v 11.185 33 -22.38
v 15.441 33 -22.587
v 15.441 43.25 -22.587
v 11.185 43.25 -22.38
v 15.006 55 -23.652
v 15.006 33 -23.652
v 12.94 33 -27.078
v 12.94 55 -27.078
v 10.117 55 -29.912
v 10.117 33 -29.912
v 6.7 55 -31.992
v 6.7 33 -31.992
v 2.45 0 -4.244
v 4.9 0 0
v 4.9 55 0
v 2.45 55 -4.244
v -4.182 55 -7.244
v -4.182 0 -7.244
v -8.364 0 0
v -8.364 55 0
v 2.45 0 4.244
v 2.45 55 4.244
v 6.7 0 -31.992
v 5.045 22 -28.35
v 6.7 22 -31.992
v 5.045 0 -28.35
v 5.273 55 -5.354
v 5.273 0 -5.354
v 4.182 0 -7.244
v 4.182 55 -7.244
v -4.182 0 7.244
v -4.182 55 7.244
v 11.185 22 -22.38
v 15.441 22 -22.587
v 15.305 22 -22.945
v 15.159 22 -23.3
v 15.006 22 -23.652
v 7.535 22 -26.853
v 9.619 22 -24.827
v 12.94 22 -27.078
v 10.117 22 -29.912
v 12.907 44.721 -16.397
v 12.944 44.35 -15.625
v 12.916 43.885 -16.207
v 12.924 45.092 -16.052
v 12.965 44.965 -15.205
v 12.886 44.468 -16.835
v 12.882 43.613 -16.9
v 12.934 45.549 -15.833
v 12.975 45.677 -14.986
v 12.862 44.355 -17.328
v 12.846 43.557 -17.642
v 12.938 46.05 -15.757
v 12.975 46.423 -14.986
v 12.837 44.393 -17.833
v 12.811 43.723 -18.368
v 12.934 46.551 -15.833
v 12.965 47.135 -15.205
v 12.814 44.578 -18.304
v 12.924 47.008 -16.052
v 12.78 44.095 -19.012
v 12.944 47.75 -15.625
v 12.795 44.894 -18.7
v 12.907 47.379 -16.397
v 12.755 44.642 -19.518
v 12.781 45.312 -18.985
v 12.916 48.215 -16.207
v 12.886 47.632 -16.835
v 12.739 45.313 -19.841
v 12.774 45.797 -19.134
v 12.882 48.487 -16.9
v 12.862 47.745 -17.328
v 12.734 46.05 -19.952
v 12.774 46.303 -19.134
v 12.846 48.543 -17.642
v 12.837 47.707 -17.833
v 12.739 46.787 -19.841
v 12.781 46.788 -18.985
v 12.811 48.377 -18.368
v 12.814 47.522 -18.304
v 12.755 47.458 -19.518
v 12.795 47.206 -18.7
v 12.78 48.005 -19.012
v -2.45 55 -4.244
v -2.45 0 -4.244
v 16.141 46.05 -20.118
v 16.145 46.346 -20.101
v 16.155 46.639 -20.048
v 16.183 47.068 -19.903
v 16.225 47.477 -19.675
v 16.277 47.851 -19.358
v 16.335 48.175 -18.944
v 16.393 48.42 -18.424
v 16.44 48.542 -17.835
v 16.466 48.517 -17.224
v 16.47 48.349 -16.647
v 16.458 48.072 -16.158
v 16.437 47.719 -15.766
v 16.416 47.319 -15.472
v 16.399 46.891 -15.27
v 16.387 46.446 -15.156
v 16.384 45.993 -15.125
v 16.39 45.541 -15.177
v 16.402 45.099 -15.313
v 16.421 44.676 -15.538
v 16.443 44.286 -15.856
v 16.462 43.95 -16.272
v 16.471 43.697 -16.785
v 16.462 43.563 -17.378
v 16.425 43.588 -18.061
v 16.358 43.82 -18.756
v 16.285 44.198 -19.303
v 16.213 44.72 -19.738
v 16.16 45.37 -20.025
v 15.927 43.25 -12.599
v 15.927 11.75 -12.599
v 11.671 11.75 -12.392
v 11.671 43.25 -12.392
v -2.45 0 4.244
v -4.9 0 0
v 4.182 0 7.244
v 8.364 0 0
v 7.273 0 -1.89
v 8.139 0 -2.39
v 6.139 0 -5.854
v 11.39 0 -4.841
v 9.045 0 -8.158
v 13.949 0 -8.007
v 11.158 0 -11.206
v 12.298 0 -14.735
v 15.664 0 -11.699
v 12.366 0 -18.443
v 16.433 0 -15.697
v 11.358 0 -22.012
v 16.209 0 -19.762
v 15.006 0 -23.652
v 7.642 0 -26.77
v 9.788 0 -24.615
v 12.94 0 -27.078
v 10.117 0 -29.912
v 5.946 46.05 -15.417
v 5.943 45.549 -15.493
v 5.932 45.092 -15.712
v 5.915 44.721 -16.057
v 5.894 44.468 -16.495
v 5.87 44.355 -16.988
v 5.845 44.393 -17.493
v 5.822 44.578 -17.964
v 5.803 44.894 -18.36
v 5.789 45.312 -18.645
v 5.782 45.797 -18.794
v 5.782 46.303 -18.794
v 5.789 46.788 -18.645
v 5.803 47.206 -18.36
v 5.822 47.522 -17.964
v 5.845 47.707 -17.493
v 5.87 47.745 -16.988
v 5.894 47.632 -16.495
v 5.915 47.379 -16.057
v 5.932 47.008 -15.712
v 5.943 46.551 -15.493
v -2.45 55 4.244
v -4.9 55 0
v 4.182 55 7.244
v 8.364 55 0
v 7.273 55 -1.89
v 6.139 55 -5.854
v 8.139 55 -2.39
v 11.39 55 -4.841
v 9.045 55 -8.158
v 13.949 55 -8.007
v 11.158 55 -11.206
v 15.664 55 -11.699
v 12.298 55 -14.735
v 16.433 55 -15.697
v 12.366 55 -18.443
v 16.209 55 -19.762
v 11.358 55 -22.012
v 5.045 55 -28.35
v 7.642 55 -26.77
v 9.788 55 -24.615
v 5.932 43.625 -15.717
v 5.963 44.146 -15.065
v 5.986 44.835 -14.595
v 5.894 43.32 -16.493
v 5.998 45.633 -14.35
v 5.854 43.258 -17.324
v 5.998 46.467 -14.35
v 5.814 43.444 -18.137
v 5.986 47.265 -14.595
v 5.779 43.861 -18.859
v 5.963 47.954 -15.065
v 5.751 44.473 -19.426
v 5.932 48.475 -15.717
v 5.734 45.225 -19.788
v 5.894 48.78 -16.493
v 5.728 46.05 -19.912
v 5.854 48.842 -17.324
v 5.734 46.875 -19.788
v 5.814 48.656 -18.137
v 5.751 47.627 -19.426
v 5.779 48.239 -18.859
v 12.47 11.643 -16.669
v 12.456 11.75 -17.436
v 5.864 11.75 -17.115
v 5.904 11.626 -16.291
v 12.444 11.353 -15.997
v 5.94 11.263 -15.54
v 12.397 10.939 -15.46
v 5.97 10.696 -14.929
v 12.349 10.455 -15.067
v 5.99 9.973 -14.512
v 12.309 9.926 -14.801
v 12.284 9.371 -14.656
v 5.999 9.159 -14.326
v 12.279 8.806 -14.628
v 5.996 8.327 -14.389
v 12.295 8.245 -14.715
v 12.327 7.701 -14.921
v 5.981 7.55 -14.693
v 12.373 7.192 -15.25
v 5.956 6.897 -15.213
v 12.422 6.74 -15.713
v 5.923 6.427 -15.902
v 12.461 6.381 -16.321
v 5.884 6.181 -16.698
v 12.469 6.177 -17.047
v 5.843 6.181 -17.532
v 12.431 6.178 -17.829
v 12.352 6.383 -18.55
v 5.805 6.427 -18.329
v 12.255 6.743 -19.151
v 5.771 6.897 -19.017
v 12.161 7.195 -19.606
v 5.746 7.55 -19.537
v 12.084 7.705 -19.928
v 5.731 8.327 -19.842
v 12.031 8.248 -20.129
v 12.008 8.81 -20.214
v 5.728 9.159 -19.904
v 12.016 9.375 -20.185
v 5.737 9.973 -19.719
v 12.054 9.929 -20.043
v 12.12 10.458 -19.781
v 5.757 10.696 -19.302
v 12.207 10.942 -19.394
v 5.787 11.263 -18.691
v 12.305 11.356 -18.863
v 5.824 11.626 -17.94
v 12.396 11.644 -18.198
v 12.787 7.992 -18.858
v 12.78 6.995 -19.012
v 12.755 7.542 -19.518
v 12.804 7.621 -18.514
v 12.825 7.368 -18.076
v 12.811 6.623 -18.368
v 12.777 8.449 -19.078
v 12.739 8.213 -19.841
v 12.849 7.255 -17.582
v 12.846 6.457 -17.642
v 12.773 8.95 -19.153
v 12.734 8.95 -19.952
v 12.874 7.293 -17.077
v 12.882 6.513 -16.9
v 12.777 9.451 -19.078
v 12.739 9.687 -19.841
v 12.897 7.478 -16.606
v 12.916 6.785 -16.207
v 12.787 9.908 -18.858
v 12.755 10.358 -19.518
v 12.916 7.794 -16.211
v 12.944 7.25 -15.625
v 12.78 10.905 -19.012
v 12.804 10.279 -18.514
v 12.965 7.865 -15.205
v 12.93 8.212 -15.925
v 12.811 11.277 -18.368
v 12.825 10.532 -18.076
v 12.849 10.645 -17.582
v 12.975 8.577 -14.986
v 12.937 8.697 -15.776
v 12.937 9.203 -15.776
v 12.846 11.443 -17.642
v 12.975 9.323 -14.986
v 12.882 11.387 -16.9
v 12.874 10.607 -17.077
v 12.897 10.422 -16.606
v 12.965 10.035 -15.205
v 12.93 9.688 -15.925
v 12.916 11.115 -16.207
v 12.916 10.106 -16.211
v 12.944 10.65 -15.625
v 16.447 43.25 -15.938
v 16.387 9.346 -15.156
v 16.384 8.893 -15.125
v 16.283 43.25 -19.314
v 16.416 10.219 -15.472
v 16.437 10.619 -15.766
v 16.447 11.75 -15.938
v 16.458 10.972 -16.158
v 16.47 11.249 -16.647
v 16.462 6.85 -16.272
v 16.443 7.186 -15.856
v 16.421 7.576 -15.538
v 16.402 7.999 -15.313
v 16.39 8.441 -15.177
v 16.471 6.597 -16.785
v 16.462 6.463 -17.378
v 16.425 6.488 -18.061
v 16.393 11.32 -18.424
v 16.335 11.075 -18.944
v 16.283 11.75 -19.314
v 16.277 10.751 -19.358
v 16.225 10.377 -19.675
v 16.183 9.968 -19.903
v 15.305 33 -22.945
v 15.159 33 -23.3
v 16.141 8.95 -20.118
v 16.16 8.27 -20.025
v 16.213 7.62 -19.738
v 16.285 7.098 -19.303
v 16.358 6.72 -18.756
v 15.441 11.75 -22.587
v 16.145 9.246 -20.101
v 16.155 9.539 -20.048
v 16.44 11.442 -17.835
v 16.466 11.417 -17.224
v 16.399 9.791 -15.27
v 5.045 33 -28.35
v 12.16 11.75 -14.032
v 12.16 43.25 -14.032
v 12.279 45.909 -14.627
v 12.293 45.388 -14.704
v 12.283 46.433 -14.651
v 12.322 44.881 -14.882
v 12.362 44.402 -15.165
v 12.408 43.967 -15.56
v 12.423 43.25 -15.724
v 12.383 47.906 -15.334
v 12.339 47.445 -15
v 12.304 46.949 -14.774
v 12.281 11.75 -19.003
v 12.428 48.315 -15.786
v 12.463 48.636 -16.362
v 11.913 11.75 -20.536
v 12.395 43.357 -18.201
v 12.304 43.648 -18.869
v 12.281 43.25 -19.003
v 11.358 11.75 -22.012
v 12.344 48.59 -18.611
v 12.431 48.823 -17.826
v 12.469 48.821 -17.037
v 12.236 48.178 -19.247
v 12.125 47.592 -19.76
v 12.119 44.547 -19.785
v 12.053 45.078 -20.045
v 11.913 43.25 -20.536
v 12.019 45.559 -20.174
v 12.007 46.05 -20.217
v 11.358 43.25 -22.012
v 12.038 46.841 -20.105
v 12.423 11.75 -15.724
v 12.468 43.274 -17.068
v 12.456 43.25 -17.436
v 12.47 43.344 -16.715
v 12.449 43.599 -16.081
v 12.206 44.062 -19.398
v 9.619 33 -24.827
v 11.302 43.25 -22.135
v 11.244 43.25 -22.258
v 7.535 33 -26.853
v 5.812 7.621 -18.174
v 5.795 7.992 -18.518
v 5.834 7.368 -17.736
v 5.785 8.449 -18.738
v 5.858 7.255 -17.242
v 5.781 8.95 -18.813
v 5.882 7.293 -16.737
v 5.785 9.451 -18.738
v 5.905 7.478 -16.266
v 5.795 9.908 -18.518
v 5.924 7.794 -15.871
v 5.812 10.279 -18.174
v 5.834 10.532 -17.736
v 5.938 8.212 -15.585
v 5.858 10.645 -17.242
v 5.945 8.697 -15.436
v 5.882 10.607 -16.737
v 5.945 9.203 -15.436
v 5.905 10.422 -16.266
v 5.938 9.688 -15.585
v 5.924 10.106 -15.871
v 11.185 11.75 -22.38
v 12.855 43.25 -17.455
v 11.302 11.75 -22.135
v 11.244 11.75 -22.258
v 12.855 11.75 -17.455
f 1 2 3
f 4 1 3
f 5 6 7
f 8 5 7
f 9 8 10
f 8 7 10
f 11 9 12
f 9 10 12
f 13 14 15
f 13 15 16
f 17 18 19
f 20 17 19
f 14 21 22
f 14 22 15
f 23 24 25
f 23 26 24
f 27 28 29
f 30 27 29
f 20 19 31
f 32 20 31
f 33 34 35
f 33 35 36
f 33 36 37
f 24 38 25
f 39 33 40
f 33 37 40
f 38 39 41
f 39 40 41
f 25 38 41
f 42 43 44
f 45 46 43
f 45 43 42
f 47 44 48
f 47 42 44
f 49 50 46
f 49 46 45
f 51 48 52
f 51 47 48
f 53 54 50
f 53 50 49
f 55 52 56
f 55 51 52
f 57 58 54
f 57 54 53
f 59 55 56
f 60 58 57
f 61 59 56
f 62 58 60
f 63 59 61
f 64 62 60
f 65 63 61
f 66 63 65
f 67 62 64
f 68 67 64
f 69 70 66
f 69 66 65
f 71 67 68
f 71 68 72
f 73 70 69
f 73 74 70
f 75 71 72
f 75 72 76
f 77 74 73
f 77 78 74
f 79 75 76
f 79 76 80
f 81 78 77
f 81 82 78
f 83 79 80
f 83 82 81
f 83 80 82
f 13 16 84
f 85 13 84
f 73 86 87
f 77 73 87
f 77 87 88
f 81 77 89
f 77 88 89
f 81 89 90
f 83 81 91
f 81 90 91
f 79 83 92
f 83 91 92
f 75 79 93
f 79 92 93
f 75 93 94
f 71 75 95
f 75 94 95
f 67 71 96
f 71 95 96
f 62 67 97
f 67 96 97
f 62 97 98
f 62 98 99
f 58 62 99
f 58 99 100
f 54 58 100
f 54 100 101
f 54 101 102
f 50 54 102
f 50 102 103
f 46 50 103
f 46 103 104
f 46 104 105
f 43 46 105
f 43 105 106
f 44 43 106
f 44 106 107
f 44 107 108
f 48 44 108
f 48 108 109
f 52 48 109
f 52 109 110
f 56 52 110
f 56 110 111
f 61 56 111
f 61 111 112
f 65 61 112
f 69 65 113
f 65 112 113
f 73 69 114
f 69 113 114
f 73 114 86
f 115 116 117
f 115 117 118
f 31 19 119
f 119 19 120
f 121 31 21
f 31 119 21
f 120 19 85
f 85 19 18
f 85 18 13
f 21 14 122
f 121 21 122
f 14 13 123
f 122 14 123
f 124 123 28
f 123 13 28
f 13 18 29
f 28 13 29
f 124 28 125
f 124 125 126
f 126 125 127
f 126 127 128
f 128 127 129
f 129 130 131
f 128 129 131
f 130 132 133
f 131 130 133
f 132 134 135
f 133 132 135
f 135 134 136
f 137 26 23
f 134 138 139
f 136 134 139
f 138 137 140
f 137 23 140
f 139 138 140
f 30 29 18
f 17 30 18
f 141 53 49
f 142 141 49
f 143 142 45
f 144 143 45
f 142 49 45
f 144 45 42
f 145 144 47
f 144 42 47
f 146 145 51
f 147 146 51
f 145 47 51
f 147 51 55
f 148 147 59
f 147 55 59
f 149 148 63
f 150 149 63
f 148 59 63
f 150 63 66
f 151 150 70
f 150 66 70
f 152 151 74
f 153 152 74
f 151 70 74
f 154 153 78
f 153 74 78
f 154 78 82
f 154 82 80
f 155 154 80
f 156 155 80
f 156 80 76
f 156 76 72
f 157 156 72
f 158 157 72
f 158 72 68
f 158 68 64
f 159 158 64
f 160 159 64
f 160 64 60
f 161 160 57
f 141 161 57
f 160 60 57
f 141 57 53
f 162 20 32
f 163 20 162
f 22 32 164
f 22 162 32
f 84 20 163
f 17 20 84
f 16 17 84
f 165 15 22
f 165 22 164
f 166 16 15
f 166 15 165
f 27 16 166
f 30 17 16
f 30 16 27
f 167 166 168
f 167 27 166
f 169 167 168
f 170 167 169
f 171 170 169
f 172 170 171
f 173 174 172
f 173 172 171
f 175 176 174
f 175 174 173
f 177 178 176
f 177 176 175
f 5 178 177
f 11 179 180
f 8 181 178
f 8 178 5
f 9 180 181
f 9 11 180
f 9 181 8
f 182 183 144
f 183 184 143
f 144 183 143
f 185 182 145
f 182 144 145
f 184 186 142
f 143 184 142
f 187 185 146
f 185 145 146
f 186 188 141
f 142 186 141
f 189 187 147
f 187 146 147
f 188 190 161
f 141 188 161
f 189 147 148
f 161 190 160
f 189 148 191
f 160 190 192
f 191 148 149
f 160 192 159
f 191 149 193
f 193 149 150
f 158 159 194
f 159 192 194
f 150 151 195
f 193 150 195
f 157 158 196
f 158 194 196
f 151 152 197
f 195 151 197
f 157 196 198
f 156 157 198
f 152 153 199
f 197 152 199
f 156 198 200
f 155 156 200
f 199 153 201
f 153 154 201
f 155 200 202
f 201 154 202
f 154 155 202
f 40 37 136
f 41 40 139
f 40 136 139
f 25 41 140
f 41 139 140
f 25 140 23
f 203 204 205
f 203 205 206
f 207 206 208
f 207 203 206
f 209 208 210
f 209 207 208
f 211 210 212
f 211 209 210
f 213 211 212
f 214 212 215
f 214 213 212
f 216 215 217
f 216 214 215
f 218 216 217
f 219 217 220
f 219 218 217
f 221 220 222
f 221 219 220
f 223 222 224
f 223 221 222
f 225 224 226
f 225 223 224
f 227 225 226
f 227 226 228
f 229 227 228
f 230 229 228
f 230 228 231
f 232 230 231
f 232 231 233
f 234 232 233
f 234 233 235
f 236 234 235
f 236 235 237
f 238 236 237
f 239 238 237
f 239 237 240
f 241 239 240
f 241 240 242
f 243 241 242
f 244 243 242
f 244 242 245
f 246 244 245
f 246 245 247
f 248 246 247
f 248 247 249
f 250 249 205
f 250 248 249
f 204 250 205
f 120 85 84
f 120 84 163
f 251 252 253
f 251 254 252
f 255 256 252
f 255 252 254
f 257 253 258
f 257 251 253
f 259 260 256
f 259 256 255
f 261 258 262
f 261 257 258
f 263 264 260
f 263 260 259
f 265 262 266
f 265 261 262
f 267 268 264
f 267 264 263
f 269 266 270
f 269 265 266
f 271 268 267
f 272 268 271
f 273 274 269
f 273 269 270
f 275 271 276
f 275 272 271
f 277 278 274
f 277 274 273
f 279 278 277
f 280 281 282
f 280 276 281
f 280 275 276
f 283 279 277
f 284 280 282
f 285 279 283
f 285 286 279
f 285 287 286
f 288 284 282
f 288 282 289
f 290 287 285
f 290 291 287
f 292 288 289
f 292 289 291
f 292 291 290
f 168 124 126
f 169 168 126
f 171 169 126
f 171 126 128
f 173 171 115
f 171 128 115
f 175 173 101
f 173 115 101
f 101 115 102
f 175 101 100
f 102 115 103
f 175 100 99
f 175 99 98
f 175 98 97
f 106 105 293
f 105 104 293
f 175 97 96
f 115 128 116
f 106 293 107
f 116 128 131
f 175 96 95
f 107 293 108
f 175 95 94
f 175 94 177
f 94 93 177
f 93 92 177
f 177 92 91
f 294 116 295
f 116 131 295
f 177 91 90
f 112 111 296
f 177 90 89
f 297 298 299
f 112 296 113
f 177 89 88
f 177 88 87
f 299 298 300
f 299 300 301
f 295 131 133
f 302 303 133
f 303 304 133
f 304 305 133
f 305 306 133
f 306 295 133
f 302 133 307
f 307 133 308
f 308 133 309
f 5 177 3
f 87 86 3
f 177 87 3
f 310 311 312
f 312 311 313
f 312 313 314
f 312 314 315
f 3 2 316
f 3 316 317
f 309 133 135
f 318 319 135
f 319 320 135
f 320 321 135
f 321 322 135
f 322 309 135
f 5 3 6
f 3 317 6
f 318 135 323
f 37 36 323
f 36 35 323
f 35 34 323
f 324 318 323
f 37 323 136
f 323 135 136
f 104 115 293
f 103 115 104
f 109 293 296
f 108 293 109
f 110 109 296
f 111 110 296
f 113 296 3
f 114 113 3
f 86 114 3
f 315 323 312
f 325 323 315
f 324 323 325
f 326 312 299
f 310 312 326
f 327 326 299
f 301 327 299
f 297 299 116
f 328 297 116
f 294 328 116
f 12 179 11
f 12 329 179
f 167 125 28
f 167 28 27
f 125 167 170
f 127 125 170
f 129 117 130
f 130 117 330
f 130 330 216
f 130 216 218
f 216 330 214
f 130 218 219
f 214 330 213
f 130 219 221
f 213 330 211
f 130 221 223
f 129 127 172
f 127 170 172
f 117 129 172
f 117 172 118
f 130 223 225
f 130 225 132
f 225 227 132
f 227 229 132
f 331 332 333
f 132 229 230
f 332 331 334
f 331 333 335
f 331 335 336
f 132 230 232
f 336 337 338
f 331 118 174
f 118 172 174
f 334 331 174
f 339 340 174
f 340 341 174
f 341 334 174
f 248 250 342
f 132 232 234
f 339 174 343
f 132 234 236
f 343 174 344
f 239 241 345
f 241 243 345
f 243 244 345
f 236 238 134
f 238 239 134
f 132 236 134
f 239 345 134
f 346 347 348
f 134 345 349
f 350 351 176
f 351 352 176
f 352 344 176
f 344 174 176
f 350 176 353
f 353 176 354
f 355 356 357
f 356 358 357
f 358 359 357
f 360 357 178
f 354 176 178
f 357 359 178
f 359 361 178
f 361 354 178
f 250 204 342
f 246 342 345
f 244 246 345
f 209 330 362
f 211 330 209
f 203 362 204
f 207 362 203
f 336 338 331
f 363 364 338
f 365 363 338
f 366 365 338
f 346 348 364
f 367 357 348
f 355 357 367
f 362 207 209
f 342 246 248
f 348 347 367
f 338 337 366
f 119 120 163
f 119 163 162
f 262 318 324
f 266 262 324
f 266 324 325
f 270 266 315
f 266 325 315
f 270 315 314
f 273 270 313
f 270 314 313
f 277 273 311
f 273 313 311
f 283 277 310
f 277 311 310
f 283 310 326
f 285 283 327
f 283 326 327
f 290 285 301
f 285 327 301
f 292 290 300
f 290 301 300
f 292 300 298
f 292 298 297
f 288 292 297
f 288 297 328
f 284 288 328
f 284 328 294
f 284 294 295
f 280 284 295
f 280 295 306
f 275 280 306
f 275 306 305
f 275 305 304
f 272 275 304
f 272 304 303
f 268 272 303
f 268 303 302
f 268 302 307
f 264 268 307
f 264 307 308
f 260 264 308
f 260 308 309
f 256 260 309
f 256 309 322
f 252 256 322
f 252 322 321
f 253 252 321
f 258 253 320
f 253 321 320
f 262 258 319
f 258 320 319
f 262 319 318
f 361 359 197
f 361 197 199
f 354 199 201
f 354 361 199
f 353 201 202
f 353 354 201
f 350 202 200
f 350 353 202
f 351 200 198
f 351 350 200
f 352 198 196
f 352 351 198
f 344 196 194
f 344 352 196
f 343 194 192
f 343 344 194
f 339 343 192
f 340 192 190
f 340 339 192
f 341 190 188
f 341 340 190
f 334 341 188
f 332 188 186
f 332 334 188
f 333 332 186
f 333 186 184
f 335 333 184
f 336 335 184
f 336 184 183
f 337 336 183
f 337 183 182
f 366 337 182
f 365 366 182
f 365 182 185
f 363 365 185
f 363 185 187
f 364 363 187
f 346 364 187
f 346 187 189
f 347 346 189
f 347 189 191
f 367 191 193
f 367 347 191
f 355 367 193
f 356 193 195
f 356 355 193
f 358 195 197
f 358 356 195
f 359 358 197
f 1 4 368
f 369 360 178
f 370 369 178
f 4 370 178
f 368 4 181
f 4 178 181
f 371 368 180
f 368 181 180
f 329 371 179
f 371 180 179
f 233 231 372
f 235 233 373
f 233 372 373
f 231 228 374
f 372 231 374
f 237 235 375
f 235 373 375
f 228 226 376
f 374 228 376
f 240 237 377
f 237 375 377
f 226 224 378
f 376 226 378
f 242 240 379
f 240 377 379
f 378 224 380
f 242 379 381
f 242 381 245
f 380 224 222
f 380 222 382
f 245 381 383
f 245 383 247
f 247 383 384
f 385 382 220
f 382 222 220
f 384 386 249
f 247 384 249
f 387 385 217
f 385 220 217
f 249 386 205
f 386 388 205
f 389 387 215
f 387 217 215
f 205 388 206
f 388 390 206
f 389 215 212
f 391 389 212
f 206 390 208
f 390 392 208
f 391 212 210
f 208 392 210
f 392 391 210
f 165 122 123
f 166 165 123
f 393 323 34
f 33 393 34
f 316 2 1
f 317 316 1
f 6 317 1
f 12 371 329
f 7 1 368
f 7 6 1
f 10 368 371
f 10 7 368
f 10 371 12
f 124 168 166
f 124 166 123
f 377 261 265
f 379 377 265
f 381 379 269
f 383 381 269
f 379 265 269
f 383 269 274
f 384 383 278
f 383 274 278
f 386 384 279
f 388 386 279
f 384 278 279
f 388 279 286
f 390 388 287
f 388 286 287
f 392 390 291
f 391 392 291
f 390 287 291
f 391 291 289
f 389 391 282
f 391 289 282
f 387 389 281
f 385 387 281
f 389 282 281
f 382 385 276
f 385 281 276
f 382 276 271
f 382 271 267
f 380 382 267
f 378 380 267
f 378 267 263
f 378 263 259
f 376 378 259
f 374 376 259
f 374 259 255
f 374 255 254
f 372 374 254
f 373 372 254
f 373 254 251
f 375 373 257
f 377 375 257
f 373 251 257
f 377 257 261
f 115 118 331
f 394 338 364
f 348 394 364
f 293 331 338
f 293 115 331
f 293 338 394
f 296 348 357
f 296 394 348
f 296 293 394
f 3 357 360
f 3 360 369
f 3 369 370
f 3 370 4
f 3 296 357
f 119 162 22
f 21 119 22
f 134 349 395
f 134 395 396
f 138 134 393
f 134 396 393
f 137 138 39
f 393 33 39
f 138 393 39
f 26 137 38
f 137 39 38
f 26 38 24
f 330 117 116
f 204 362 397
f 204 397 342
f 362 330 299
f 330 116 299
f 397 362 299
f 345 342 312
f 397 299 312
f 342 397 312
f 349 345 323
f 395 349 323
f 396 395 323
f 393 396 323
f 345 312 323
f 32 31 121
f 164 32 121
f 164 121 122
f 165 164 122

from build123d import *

# Parameters (mm, degrees)
BOSS_EXTRUDE1_DEPTH = 55
SKETCH2_W           = 4
SKETCH2_H           = 55
SKETCH6_R           = 2.5
CUT_EXTRUDE1_DEPTH  = 10
SKETCH7_W           = 10
SKETCH7_H           = 31.5
CUT_EXTRUDE2_DEPTH  = 10
SKETCH8_W           = 9.818662261
SKETCH8_H           = 11
CUT_EXTRUDE3_DEPTH  = 69.208914829
BOSS_EXTRUDE2_START = -3.6
SKETCH9_R           = 2.8
SKETCH9_R_2         = 1.7
BOSS_EXTRUDE2_DEPTH = 7


with BuildPart() as part:
    # Sketch1 → Boss-Extrude1 (new body)
    with BuildSketch(Plane(origin=(0, 0, 0), x_dir=(1, 0, 0), z_dir=(0, 1, 0))):
        Polygon((-4.182050808, 7.243524479), (-8.364101615, 0), (-4.182050808, -7.243524479), (4.182050808, -7.243524479), (8.364101615, 0), (4.182050808, 7.243524479), align=None)
        Polygon((-4.9, 0), (-2.45, -4.243524479), (2.45, -4.243524479), (4.9, 0), (2.45, 4.243524479), (-2.45, 4.243524479), align=None, mode=Mode.SUBTRACT)
    extrude(amount=BOSS_EXTRUDE1_DEPTH)

    # Sweep1: sweep along a path in Sketch3
    with BuildLine(Plane(origin=(0, 55, 0), x_dir=(1, 0, 0), z_dir=(0, 1, 0))) as sweep1_path:
        Line((6.273076211, 3.621762239), (7.139101615, 4.121762239))
        ThreePointArc((7.139101615, 4.121762239), (13.761110972, 12.313986191), (13.182050808, 22.831981747))
        ThreePointArc((13.182050808, 22.831981747), (10.196814467, 27.168510904), (5.872312911, 30.17114432))
    # Sketch2 → Sweep1 (sweep)
    with BuildSketch(Plane(origin=(6.273076211, 0, -3.621762239), x_dir=(-0.5000000000000001, 0, -0.8660254037844386), z_dir=(0.8660254037844386, 0, -0.5000000000000001))):
        with Locations((0, 27.5)):
            Rectangle(SKETCH2_W, SKETCH2_H)
    sweep(path=sweep1_path.line)

    # Sketch6 → Cut-Extrude1 (cut)
    with BuildSketch(Plane(origin=(17.267694528, 0, -0.839732793), x_dir=(-0.0485728772715999, 0, -0.9988196411732992), z_dir=(0.9988196411732992, 0, -0.0485728772715999))):
        with Locations((16.810213392, 46.05)):
            Circle(SKETCH6_R)
        with Locations((16.810213392, 8.95)):
            Circle(SKETCH6_R)
    extrude(amount=-CUT_EXTRUDE1_DEPTH, mode=Mode.SUBTRACT)

    # Sketch7 → Cut-Extrude2 (cut)
    with BuildSketch(Plane(origin=(17.267694528, 0, -0.839732793), x_dir=(-0.0485728772715999, 0, -0.9988196411732992), z_dir=(0.9988196411732992, 0, -0.0485728772715999))):
        with Locations((16.810213392, 27.5)):
            Rectangle(SKETCH7_W, SKETCH7_H)
    extrude(amount=-CUT_EXTRUDE2_DEPTH, mode=Mode.SUBTRACT)

    # Sketch8 → Cut-Extrude3 (cut, through all)
    with BuildSketch(Plane(origin=(17.267694528, 0, -0.839732793), x_dir=(-0.0485728772715999, 0, -0.9988196411732992), z_dir=(0.9988196411732992, 0, -0.0485728772715999))):
        with Locations((26.719544523, 27.5)):
            Rectangle(SKETCH8_W, SKETCH8_H)
    extrude(amount=-CUT_EXTRUDE3_DEPTH, mode=Mode.SUBTRACT)

    # Sketch9 → Boss-Extrude2 (add)
    # profile 1 of 2: a face of its own
    with BuildSketch(Plane(origin=(17.267694528, 0, -0.839732793), x_dir=(-0.0485728772715999, 0, -0.9988196411732992), z_dir=(0.9988196411732992, 0, -0.0485728772715999)).offset(BOSS_EXTRUDE2_START)):
        with Locations((16.810213392, 46.05)):
            Circle(SKETCH9_R)
        with Locations(Location((16.810213392, 46.05, 0), (0, 0, 180))):
            Circle(SKETCH9_R_2, mode=Mode.SUBTRACT)
    # profile 2 of 2: a face of its own
    with BuildSketch(Plane(origin=(17.267694528, 0, -0.839732793), x_dir=(-0.0485728772715999, 0, -0.9988196411732992), z_dir=(0.9988196411732992, 0, -0.0485728772715999)).offset(BOSS_EXTRUDE2_START)):
        with Locations(Location((16.810213392, 8.95, 0), (0, 0, 90.000000002))):
            Circle(SKETCH9_R)
        with Locations((16.810213392, 8.95)):
            Circle(SKETCH9_R_2, mode=Mode.SUBTRACT)
    extrude(amount=-BOSS_EXTRUDE2_DEPTH)


solid = part.part
